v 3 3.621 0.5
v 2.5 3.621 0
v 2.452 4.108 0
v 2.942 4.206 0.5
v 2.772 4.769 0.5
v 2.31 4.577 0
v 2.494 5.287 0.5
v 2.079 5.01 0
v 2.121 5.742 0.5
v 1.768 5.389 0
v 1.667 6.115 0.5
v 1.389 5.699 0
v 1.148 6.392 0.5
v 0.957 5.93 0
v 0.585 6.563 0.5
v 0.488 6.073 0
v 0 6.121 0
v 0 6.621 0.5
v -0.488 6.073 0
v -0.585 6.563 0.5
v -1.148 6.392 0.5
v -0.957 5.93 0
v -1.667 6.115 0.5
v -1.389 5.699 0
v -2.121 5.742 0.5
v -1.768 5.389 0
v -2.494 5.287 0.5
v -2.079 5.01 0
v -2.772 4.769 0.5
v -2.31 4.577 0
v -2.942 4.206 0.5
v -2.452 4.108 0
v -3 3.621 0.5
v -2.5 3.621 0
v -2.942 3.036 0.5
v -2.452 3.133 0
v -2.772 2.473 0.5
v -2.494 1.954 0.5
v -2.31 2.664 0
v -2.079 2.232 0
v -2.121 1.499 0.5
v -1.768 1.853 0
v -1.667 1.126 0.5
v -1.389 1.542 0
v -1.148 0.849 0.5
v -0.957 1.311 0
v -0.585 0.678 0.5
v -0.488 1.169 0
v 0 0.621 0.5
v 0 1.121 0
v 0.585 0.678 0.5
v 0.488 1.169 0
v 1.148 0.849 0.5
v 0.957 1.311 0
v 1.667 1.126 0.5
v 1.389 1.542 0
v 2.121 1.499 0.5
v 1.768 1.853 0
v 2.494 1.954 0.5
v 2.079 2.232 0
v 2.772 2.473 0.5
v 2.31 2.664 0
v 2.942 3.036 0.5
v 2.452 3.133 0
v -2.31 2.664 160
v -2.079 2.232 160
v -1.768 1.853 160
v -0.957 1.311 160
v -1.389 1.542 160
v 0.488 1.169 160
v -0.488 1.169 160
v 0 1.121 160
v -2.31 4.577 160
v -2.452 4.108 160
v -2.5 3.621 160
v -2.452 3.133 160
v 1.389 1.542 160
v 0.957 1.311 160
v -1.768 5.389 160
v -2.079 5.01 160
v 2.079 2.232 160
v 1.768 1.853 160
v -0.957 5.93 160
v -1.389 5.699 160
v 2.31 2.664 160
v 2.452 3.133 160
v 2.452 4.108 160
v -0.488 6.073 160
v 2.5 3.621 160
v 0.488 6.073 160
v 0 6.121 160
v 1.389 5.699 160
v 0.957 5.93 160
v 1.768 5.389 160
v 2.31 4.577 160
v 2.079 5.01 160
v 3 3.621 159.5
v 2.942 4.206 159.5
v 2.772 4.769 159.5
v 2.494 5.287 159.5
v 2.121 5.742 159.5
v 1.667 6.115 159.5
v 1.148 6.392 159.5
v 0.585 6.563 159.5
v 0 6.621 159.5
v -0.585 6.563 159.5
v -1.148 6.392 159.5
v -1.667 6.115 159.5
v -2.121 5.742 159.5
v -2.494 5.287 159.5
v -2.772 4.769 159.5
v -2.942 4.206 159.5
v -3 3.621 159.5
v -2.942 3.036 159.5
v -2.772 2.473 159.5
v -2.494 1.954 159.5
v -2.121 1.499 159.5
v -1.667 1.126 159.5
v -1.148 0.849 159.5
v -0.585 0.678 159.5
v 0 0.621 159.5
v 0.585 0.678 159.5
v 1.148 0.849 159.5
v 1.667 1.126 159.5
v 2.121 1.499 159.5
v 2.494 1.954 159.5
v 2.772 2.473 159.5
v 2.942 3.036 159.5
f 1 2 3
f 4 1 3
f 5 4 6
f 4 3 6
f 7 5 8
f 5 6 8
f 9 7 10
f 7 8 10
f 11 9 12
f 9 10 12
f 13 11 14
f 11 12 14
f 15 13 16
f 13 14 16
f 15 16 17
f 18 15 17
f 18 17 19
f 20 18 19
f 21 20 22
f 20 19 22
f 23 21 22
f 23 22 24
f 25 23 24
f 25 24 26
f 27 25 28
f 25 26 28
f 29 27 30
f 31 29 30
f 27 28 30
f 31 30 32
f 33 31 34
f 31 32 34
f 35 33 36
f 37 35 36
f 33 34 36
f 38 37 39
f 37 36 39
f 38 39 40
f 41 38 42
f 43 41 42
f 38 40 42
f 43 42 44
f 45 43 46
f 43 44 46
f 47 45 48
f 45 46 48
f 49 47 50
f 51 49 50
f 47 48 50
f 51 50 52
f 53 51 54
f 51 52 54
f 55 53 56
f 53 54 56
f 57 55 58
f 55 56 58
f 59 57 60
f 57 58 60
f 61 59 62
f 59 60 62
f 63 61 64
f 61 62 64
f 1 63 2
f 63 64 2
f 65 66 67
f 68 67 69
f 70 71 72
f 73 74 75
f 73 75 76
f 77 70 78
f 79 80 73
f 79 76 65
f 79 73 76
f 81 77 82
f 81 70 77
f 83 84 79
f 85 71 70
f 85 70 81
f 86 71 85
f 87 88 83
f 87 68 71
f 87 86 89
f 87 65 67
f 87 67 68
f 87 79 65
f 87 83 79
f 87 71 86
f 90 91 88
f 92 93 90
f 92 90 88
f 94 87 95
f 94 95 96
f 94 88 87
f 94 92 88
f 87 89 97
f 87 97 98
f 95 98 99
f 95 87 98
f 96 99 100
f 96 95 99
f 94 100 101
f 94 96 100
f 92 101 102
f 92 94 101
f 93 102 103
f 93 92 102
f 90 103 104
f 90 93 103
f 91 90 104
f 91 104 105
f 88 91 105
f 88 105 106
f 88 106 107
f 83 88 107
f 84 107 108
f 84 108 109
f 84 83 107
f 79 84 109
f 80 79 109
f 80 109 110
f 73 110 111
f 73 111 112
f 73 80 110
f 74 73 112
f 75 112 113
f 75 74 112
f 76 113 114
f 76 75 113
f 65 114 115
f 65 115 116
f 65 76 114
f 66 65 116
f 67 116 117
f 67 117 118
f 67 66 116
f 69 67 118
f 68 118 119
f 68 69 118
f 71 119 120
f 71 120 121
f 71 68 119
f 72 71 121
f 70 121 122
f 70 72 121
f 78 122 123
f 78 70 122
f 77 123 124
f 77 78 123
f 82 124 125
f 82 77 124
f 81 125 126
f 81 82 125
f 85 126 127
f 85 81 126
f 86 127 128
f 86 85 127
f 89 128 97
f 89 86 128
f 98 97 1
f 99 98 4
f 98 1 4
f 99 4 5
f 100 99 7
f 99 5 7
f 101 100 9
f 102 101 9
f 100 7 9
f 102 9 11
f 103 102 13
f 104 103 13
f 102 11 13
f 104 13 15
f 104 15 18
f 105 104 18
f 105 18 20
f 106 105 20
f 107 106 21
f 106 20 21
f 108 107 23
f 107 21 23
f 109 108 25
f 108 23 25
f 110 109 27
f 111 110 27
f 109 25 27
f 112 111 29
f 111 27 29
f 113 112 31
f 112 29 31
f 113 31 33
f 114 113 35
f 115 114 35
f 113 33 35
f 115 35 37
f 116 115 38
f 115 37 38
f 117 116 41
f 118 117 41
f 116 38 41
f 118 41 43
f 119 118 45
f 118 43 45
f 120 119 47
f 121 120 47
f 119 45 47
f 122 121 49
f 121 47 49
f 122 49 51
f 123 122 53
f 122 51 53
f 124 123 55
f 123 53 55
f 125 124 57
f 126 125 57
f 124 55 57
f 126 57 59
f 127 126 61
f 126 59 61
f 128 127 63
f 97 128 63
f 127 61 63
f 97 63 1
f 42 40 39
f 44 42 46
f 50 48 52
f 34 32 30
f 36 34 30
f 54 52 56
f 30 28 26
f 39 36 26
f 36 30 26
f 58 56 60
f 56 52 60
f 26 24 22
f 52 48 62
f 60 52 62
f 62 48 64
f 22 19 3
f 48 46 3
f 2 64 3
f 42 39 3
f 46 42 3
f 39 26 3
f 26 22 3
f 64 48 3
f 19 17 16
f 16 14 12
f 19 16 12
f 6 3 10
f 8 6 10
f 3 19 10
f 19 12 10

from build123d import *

# Parameters (mm, degrees)
SKETCH1_R           = 3
BOSS_EXTRUDE1_DEPTH = 160
CHAMFER1_SIZE       = 0.5
CHAMFER2_SIZE       = 0.5


with BuildPart() as part:
    # Sketch1 → Boss-Extrude1 (new body)
    with BuildSketch(Plane.XY):
        with Locations((0, 3.620771249)):
            Circle(SKETCH1_R)
    extrude(amount=BOSS_EXTRUDE1_DEPTH)

    # Chamfer1
    chamfer1_edges = [part.edges().sort_by_distance(p)[0] for p in [
        (-3, 3.620771249, 160),
    ]]
    chamfer(chamfer1_edges, length=CHAMFER1_SIZE)

    # Chamfer2
    chamfer2_edges = [part.edges().sort_by_distance(p)[0] for p in [
        (-3, 3.620771249, 0),
    ]]
    chamfer(chamfer2_edges, length=CHAMFER2_SIZE)


solid = part.part
